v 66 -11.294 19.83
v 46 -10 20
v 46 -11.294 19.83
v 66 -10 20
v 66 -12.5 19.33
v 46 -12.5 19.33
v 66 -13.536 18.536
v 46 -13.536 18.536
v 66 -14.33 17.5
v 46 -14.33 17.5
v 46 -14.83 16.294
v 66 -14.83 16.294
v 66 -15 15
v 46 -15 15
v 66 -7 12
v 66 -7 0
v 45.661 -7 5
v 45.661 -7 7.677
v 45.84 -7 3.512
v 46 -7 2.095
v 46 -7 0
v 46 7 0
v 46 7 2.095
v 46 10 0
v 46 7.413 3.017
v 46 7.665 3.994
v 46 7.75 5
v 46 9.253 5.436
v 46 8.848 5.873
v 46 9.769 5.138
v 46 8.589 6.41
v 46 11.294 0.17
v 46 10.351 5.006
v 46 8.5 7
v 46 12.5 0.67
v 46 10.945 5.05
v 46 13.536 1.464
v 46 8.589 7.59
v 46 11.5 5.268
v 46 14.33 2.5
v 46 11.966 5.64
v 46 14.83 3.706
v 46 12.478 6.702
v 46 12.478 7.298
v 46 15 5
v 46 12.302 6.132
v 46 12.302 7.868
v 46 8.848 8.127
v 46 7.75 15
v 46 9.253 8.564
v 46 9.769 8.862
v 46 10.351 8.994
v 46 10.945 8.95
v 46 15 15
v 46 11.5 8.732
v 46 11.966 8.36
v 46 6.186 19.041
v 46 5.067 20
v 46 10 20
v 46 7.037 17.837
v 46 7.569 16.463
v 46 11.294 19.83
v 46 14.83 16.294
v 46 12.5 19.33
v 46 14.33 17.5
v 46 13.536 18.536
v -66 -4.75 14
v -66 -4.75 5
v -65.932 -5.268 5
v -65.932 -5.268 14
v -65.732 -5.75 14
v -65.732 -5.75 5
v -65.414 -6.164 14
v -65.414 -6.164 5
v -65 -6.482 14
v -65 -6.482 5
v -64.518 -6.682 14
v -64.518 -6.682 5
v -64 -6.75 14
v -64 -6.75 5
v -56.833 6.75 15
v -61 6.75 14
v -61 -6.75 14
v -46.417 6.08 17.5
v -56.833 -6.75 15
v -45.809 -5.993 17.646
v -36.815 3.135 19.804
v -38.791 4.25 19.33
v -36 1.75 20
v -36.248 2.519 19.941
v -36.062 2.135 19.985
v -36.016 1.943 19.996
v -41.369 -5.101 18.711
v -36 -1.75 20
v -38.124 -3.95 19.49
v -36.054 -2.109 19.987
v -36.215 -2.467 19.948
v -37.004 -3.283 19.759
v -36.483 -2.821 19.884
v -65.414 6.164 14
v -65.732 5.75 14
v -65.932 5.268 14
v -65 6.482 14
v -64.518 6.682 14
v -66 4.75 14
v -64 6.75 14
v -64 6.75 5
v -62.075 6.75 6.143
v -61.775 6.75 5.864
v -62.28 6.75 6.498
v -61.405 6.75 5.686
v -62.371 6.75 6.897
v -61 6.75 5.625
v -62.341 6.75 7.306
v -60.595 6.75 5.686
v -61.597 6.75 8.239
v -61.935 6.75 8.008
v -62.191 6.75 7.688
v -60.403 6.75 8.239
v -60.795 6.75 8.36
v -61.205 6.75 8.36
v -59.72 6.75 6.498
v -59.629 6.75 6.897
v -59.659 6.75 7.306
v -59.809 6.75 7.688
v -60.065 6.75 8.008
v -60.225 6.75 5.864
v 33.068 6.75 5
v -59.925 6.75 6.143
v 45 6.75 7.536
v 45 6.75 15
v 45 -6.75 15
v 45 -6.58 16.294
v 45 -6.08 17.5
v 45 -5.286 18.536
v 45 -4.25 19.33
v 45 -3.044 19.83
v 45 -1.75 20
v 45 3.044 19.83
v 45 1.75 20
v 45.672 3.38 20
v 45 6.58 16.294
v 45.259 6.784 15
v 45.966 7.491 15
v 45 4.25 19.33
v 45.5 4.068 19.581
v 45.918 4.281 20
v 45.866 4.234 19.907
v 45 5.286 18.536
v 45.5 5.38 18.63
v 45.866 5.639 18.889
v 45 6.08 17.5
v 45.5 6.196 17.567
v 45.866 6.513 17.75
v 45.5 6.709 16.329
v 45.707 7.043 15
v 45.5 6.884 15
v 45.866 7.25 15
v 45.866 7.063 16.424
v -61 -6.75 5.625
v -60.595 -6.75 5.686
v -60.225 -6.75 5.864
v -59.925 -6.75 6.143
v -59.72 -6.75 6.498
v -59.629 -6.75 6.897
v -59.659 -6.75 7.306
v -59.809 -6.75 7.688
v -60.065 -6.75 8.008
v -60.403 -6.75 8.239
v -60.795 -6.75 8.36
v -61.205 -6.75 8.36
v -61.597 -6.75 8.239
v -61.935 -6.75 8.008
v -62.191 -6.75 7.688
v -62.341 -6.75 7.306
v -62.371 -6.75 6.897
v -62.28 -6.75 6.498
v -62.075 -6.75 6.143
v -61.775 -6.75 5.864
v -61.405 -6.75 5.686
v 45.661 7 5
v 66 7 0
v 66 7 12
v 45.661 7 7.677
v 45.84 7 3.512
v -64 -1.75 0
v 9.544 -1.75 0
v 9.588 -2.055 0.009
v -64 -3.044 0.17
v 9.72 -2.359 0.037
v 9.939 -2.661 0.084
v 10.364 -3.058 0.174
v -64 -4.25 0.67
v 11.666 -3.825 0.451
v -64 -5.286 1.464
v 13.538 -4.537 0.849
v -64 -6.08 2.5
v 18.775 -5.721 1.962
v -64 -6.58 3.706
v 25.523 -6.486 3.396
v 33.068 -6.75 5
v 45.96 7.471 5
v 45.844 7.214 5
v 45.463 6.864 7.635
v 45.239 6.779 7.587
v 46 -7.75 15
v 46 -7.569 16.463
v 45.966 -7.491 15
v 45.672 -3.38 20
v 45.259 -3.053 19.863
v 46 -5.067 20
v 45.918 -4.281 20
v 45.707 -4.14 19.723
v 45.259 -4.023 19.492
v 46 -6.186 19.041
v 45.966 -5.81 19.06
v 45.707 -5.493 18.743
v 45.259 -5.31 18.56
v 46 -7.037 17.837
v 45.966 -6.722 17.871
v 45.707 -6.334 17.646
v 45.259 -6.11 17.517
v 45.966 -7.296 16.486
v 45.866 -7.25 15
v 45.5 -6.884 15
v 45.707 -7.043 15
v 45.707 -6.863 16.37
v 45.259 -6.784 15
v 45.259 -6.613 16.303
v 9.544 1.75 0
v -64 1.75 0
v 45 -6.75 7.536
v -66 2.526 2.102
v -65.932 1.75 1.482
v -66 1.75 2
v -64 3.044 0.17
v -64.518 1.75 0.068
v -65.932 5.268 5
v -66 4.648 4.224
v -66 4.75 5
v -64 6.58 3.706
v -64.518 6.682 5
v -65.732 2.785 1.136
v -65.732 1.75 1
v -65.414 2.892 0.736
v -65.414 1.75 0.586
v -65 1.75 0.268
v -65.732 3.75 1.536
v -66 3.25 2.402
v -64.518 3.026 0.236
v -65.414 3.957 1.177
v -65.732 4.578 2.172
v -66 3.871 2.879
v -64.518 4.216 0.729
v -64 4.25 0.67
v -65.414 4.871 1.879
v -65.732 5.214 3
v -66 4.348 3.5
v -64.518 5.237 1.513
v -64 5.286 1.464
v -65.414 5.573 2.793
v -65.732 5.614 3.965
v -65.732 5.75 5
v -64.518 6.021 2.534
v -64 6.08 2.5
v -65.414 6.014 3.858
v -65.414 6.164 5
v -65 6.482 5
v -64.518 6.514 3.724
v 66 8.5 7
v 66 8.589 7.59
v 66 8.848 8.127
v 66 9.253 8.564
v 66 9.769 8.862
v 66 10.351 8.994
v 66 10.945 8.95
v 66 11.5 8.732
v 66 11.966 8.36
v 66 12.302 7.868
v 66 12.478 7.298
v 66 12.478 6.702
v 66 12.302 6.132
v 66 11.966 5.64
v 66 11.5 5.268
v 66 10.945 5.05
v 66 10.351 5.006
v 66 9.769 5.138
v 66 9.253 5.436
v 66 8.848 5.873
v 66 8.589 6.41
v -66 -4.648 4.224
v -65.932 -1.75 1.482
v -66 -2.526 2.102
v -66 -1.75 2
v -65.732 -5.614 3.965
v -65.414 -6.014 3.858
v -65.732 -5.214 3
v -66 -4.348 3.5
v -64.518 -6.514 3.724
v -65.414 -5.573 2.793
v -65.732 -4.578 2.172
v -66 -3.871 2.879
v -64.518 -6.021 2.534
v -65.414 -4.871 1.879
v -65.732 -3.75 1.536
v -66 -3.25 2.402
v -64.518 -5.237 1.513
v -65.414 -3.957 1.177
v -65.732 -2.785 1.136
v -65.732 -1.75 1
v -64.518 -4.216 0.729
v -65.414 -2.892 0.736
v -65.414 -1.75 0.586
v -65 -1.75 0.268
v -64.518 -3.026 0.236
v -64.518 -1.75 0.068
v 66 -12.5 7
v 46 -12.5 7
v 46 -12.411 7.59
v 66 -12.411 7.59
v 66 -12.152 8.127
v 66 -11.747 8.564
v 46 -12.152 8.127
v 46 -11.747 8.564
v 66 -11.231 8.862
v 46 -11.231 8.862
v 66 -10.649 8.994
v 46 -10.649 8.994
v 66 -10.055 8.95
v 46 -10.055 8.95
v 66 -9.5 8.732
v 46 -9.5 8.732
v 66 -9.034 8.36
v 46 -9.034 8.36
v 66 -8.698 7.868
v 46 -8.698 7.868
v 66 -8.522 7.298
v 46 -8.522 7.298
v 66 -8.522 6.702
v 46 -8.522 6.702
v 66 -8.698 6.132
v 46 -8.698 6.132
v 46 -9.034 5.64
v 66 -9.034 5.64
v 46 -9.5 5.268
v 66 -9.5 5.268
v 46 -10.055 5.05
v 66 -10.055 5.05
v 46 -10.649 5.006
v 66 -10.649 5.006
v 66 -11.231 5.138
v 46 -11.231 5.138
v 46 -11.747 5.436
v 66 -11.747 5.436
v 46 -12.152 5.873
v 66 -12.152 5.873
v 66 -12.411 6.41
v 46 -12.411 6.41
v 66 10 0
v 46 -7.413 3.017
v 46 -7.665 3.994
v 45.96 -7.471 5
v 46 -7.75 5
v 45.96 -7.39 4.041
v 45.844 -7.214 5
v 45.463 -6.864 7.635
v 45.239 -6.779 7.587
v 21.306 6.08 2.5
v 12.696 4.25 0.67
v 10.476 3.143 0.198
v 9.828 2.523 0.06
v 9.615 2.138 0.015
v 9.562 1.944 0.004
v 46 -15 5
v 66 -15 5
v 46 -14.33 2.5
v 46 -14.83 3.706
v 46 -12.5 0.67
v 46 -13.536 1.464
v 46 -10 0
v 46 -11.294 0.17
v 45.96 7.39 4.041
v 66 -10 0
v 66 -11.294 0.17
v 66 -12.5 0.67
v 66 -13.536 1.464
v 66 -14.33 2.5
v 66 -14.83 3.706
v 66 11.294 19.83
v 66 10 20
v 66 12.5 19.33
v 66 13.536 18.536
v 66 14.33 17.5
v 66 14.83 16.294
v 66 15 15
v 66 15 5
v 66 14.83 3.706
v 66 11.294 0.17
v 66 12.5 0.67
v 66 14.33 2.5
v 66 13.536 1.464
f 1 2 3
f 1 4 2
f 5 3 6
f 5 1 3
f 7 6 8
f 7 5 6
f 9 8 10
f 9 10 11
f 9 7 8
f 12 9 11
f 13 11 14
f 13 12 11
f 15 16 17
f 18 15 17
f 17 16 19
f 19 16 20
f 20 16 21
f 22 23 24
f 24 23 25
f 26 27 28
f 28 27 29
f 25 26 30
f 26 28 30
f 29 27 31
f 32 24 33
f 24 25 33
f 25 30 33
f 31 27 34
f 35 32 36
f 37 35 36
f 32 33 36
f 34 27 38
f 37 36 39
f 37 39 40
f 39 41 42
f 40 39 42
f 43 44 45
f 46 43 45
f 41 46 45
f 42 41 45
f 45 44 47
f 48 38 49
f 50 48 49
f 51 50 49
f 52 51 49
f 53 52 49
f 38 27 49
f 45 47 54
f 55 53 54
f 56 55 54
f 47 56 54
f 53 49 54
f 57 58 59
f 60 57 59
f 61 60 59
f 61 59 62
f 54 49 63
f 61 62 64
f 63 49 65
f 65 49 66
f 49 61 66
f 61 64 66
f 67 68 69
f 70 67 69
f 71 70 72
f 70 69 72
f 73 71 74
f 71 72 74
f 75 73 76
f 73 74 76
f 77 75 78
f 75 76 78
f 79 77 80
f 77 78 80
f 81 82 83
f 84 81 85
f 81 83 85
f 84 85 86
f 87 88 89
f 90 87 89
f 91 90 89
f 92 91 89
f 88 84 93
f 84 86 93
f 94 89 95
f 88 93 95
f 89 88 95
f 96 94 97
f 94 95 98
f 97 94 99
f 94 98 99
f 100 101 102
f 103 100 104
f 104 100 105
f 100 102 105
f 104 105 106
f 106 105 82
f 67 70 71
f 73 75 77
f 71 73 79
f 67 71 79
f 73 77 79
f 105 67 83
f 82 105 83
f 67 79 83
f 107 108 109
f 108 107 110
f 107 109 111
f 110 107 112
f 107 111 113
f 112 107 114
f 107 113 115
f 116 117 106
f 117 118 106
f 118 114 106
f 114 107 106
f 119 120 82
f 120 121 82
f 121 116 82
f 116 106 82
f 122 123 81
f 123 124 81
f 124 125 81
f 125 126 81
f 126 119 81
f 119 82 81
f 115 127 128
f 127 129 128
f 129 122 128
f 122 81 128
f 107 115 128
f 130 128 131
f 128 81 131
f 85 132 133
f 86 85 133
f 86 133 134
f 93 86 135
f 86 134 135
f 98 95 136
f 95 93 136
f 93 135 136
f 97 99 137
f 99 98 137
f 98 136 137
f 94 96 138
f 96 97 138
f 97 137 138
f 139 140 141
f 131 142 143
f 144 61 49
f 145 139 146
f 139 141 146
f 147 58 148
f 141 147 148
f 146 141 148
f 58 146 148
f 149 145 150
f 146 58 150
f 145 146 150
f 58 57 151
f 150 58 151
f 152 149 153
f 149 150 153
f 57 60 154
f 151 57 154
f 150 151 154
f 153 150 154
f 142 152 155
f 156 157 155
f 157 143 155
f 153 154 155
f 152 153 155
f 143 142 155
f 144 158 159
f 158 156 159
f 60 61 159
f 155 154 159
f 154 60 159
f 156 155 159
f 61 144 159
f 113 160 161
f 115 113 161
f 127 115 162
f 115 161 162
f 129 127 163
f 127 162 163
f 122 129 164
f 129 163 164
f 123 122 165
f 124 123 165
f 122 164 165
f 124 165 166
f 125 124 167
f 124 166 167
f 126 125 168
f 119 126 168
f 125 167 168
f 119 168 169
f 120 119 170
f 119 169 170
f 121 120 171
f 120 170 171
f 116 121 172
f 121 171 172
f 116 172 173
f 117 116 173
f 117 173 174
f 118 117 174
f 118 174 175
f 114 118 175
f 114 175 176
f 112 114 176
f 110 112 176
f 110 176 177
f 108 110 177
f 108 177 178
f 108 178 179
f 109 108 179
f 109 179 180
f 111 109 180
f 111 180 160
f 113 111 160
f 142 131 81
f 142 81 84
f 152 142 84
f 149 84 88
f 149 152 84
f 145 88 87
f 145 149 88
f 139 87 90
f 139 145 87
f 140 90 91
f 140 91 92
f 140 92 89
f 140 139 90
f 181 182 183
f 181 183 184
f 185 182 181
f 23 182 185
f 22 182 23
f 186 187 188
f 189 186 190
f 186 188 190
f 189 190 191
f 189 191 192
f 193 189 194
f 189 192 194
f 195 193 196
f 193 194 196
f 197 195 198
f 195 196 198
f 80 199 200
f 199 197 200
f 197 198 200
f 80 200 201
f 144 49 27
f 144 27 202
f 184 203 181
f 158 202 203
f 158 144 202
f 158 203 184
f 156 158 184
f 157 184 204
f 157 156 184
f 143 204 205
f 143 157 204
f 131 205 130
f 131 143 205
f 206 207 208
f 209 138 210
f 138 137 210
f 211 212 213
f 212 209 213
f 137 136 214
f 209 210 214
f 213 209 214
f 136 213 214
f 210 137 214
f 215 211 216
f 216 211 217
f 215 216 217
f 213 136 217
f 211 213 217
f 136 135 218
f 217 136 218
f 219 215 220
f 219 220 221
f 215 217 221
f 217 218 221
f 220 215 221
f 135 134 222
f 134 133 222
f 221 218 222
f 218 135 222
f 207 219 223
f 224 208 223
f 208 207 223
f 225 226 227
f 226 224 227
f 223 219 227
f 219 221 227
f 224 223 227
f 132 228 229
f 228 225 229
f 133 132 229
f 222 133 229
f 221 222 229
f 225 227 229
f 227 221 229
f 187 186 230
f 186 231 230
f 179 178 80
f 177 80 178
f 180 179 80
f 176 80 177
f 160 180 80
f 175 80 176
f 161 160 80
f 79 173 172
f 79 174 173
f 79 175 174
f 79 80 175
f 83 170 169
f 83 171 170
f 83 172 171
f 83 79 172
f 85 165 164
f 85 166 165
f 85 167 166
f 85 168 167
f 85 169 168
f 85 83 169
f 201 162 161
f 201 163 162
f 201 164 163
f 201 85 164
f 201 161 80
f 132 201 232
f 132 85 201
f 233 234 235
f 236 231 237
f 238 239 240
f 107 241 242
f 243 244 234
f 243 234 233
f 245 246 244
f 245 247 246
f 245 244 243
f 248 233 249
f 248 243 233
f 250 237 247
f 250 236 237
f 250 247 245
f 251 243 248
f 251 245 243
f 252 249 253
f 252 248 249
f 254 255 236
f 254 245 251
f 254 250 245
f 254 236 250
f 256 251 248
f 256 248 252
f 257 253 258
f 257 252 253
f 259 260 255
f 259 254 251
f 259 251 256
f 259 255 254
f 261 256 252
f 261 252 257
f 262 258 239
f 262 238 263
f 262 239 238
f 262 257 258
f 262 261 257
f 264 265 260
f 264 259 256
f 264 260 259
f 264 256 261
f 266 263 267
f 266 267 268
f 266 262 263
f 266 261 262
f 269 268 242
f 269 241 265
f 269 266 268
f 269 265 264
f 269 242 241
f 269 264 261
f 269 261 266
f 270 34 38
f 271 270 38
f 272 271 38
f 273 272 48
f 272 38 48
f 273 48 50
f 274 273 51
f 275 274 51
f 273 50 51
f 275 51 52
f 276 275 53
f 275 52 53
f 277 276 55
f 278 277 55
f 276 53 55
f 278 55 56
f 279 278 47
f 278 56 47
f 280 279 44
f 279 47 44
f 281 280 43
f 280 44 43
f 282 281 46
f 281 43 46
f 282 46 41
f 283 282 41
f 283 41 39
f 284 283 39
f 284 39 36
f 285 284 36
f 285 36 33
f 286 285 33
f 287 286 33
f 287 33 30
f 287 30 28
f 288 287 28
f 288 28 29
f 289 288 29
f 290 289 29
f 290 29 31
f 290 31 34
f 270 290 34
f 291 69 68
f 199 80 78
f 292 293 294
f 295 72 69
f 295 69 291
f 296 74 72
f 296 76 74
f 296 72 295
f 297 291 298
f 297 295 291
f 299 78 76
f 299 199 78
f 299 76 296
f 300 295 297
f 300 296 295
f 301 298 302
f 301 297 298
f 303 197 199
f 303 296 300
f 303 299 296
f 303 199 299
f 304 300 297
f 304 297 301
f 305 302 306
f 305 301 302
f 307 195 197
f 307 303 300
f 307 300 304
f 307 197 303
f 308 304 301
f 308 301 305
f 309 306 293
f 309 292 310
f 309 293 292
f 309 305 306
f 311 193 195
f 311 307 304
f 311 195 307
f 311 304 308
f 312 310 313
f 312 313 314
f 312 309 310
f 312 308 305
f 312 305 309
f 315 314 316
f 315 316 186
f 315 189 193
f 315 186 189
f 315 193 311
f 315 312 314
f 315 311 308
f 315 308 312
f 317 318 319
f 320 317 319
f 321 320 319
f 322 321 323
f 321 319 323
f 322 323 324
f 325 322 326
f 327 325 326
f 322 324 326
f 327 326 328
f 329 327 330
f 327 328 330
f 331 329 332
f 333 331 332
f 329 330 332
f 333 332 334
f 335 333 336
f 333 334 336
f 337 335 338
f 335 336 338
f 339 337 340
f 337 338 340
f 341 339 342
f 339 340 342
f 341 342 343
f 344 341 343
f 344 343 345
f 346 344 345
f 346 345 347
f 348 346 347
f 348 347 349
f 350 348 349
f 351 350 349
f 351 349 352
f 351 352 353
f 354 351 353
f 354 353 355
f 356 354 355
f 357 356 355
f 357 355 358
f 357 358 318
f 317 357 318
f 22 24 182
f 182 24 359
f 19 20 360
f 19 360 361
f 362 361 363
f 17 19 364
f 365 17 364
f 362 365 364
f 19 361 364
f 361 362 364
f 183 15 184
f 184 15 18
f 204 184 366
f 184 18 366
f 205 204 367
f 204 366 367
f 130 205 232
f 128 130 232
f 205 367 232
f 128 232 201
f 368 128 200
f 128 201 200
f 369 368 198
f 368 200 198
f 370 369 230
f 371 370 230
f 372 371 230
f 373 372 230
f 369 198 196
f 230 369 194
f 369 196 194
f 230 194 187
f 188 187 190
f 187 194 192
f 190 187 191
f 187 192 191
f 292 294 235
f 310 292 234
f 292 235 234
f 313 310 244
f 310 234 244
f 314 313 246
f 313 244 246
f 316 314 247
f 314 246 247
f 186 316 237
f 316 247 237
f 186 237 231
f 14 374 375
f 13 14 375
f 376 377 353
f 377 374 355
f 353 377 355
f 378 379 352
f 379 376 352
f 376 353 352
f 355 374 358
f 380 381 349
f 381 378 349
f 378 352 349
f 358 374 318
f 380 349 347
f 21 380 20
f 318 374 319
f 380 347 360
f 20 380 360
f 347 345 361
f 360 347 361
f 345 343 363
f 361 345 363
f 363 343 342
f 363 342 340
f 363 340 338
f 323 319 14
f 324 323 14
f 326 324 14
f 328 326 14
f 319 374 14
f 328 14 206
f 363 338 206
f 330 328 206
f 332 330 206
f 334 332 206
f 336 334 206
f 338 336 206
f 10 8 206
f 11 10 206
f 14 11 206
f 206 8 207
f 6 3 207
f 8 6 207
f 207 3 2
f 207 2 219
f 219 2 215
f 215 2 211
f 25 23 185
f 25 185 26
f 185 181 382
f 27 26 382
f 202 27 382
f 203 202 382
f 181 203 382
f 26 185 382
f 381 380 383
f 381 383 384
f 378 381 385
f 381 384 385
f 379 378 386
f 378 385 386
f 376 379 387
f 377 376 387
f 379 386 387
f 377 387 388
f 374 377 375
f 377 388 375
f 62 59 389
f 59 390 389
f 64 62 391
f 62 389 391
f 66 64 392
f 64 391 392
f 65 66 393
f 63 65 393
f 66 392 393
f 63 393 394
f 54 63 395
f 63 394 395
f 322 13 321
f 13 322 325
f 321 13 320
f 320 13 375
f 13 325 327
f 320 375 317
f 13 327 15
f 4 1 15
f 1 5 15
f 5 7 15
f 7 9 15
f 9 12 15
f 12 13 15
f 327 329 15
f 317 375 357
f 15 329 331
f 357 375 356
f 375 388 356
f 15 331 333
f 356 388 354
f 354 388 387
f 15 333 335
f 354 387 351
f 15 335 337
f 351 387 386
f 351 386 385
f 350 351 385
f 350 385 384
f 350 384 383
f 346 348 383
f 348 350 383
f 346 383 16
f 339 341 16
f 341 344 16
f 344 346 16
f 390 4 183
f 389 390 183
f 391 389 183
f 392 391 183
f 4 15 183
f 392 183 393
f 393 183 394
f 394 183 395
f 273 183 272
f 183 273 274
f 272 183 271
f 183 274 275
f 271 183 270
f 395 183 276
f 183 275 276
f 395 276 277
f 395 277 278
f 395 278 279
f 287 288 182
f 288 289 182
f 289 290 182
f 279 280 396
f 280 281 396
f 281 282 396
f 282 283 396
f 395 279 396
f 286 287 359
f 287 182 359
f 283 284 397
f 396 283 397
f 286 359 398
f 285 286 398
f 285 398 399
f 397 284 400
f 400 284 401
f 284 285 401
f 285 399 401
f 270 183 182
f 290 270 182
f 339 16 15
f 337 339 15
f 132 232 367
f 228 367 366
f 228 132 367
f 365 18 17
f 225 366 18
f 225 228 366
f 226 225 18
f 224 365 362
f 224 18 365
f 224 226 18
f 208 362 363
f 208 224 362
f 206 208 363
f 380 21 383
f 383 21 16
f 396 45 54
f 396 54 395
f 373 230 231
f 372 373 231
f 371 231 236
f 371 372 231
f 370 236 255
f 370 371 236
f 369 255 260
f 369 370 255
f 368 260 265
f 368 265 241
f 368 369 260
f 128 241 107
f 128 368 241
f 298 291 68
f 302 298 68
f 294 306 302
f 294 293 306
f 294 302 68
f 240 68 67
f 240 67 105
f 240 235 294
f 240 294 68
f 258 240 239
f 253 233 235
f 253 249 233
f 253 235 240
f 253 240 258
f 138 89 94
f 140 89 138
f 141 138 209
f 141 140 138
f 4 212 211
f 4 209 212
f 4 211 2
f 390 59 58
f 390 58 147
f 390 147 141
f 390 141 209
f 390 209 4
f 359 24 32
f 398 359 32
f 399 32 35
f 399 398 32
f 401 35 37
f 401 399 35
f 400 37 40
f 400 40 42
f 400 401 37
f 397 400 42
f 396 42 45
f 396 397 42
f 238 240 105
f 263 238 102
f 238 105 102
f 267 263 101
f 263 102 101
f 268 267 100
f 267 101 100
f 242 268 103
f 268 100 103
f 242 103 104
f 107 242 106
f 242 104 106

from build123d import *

# Parameters (mm, degrees)
ESQUISSE1_W                  = 132
ESQUISSE1_H                  = 30
BOSS_EXTRU_1_DEPTH           = 20
ESQUISSE3_W                  = 112
ESQUISSE3_H                  = 8.25
ENL_V_MAT_EXTRU_1_DEPTH      = 71.576199954
ENL_V_MAT_EXTRU_2_REACH      = 74.312
ESQUISSE4_R                  = 1.375
ESQUISSE5_R                  = 2
ENL_V_MAT_EXTRU_3_DEPTH      = 80
CONG_1_R                     = 5
CONG_2_R                     = 5
CONG_3_R                     = 1
ENL_V_MAT_EXTRU_4_DEPTH      = 7
ENL_V_MAT_EXTRU_4_DEPTH_BACK = 7
CONG_4_R                     = 2
ENL_V_MAT_EXTRU_5_DEPTH      = 71.576200076
ENL_V_MAT_EXTRU_5_DEPTH_BACK = 71.576200076


with BuildPart() as part:
    # Esquisse1 → Boss.-Extru.1 (new body)
    with BuildSketch(Plane.XY):
        Rectangle(ESQUISSE1_W, ESQUISSE1_H)
    extrude(amount=BOSS_EXTRU_1_DEPTH)

    # Esquisse3 → Enlèv. mat.-Extru.1 (cut, through all)
    with BuildSketch(Plane.XY.offset(20)):
        with Locations((-10, 10.875)):
            Rectangle(ESQUISSE3_W, ESQUISSE3_H)
        with Locations((-10, -10.875)):
            Rectangle(ESQUISSE3_W, ESQUISSE3_H)
    extrude(amount=-ENL_V_MAT_EXTRU_1_DEPTH, mode=Mode.SUBTRACT)

    # Esquisse4 → Enlèv. mat.-Extru.2 (cut, up to next)
    with BuildSketch(Plane.XZ.offset(6.75), mode=Mode.PRIVATE) as enl_v_mat_extru_2_sk1:
        with Locations(Location((-61, 7, 0), (0, 0, 270))):
            Circle(ESQUISSE4_R)
    enl_v_mat_extru_2_tool1 = extrude(enl_v_mat_extru_2_sk1.sketch, amount=-ENL_V_MAT_EXTRU_2_REACH, mode=Mode.PRIVATE) & part.part
    add(enl_v_mat_extru_2_tool1.solids().sort_by_distance((-61, -6.75, 7))[0], mode=Mode.SUBTRACT)

    # Esquisse5 → Enlèv. mat.-Extru.3 (cut)
    with BuildSketch(Plane.ZY.offset(-46)):
        with Locations(Location((7, -10.5, 0), (0, 0, 270))):
            Circle(ESQUISSE5_R)
        with Locations(Location((7, 10.5, 0), (0, 0, 270))):
            Circle(ESQUISSE5_R)
    extrude(amount=-ENL_V_MAT_EXTRU_3_DEPTH, mode=Mode.SUBTRACT)

    # Congé1
    cong_1_edges = [part.edges().sort_by_distance(p)[0] for p in [
        (56, -15, 0),
        (56, -15, 20),
        (56, 15, 0),
        (56, 15, 20),
    ]]
    fillet(cong_1_edges, radius=CONG_1_R)

    # Congé2
    cong_2_edges = [part.edges().sort_by_distance(p)[0] for p in [
        (-10, 6.75, 0),
        (-10, 6.75, 20),
        (-10, -6.75, 0),
        (-10, -6.75, 20),
    ]]
    fillet(cong_2_edges, radius=CONG_2_R)

    # Congé3
    # the kernel refuses this fillet: 1 mm, written as the material it adds along each edge
    with BuildSketch(Plane(origin=(46, -6.75, 15), x_dir=(0, -1, 0), z_dir=(0, 0, -1))) as cong_3_piece_1:
        with BuildLine():
            CenterArc((CONG_3_R, CONG_3_R), CONG_3_R, 180, 90)
            Line((0, CONG_3_R), (0, 0))
            Line((0, 0), (CONG_3_R, 0))
        make_face()
    extrude(amount=10)
    with BuildSketch(Plane(origin=(46, 6.75, 15), x_dir=(0, 1, 0), z_dir=(0, 0, -1))) as cong_3_piece_2:
        with BuildLine():
            CenterArc((CONG_3_R, -CONG_3_R), CONG_3_R, 90, 90)
            Line((0, -CONG_3_R), (0, 0))
            Line((0, 0), (CONG_3_R, 0))
        make_face()
    extrude(amount=10)
    with BuildSketch(Plane(origin=(46, -1.75, 15), x_dir=(0, 0.7515057138603058, 0.6597265812708415), z_dir=(0, 0.6597265812708415, -0.7515057138603058))) as cong_3_piece_3_section:
        with BuildLine():
            CenterArc((5 + CONG_3_R, -CONG_3_R), CONG_3_R, 90, 90)
            Line((5, -CONG_3_R), (5, 0))
            Line((5, 0), (5 + CONG_3_R, 0))
        make_face()
    cong_3_piece_3 = revolve(axis=Axis((46, -1.75, 15), (1, 0, 0)), revolution_arc=138.720976341, mode=Mode.PRIVATE)
    cong_3_piece_3 = split(cong_3_piece_3, bisect_by=Plane(origin=(46, -1.75, 20), z_dir=(0, 0, -1)), keep=Keep.TOP, mode=Mode.PRIVATE)
    add(cong_3_piece_3)
    with BuildSketch(Plane(origin=(46, 1.75, 15), x_dir=(0, -0.7515057138603058, 0.6597265812708415), z_dir=(0, -0.6597265812708415, -0.7515057138603058))) as cong_3_piece_4_section:
        with BuildLine():
            CenterArc((5 + CONG_3_R, CONG_3_R), CONG_3_R, 180, 90)
            Line((5, CONG_3_R), (5, 0))
            Line((5, 0), (5 + CONG_3_R, 0))
        make_face()
    cong_3_piece_4 = revolve(axis=Axis((46, 1.75, 15), (-1, 0, 0)), revolution_arc=138.720976341, mode=Mode.PRIVATE)
    cong_3_piece_4 = split(cong_3_piece_4, bisect_by=Plane(origin=(46, 1.75, 20), z_dir=(0, 0, -1)), keep=Keep.TOP, mode=Mode.PRIVATE)
    add(cong_3_piece_4)
    with BuildSketch(Plane(origin=(46, 1.75, 5), x_dir=(0, -0.7515057138603056, -0.6597265812708417), z_dir=(0, -0.6597265812708417, 0.7515057138603056))) as cong_3_piece_5_section:
        with BuildLine():
            CenterArc((5 + CONG_3_R, -CONG_3_R), CONG_3_R, 90, 90)
            Line((5, -CONG_3_R), (5, 0))
            Line((5, 0), (5 + CONG_3_R, 0))
        make_face()
    cong_3_piece_5 = revolve(axis=Axis((46, 1.75, 5), (1, 0, 0)), revolution_arc=138.720976341, mode=Mode.PRIVATE)
    cong_3_piece_5 = split(cong_3_piece_5, bisect_by=Plane(origin=(46, 1.75, 0), z_dir=(0, 0, 1)), keep=Keep.TOP, mode=Mode.PRIVATE)
    add(cong_3_piece_5)
    with BuildSketch(Plane(origin=(46, -1.75, 5), x_dir=(0, 0.7515057138603056, -0.6597265812708416), z_dir=(0, 0.6597265812708416, 0.7515057138603056))) as cong_3_piece_6_section:
        with BuildLine():
            CenterArc((5 + CONG_3_R, CONG_3_R), CONG_3_R, 180, 90)
            Line((5, CONG_3_R), (5, 0))
            Line((5, 0), (5 + CONG_3_R, 0))
        make_face()
    cong_3_piece_6 = revolve(axis=Axis((46, -1.75, 5), (-1, 0, 0)), revolution_arc=138.720976341, mode=Mode.PRIVATE)
    cong_3_piece_6 = split(cong_3_piece_6, bisect_by=Plane(origin=(46, -1.75, 0), z_dir=(0, 0, 1)), keep=Keep.TOP, mode=Mode.PRIVATE)
    add(cong_3_piece_6)

    # Esquisse7 → Enlèv. mat.-Extru.4 (cut, two sides: drawn at the far end of the back side and taken through both)
    with BuildSketch(Plane(origin=(0, 0, 0), x_dir=(1, 0, 0), z_dir=(0, 1, 0)).offset(-ENL_V_MAT_EXTRU_4_DEPTH_BACK)):
        Polygon((66, -12), (9.544438686, 0), (66, 0), align=None)
    extrude(amount=ENL_V_MAT_EXTRU_4_DEPTH + ENL_V_MAT_EXTRU_4_DEPTH_BACK, mode=Mode.SUBTRACT)

    # Congé4
    cong_4_edges = [part.edges().sort_by_distance(p)[0] for p in [
        (-66, -6.75, 10),
        (-66, 0, 20),
        (-66, 6.75, 10),
        (-66, 0, 0),
        (-66, -5.285533906, 1.464466094),
        (-66, 5.285533906, 1.464466094),
        (-66, 5.285533906, 18.535533906),
        (-66, -5.285533906, 18.535533906),
    ]]
    fillet(cong_4_edges, radius=CONG_4_R)

    # Esquisse8 → Enlèv. mat.-Extru.5 (cut, two sides: drawn at the far end of the back side and taken through both)
    with BuildSketch(Plane(origin=(0, 0, 0), x_dir=(1, 0, 0), z_dir=(0, 1, 0)).offset(-ENL_V_MAT_EXTRU_5_DEPTH_BACK)):
        Polygon((-36, -20), (-66, -20), (-66, -14), (-61, -14), align=None)
    extrude(amount=ENL_V_MAT_EXTRU_5_DEPTH + ENL_V_MAT_EXTRU_5_DEPTH_BACK, mode=Mode.SUBTRACT)


solid = part.part
